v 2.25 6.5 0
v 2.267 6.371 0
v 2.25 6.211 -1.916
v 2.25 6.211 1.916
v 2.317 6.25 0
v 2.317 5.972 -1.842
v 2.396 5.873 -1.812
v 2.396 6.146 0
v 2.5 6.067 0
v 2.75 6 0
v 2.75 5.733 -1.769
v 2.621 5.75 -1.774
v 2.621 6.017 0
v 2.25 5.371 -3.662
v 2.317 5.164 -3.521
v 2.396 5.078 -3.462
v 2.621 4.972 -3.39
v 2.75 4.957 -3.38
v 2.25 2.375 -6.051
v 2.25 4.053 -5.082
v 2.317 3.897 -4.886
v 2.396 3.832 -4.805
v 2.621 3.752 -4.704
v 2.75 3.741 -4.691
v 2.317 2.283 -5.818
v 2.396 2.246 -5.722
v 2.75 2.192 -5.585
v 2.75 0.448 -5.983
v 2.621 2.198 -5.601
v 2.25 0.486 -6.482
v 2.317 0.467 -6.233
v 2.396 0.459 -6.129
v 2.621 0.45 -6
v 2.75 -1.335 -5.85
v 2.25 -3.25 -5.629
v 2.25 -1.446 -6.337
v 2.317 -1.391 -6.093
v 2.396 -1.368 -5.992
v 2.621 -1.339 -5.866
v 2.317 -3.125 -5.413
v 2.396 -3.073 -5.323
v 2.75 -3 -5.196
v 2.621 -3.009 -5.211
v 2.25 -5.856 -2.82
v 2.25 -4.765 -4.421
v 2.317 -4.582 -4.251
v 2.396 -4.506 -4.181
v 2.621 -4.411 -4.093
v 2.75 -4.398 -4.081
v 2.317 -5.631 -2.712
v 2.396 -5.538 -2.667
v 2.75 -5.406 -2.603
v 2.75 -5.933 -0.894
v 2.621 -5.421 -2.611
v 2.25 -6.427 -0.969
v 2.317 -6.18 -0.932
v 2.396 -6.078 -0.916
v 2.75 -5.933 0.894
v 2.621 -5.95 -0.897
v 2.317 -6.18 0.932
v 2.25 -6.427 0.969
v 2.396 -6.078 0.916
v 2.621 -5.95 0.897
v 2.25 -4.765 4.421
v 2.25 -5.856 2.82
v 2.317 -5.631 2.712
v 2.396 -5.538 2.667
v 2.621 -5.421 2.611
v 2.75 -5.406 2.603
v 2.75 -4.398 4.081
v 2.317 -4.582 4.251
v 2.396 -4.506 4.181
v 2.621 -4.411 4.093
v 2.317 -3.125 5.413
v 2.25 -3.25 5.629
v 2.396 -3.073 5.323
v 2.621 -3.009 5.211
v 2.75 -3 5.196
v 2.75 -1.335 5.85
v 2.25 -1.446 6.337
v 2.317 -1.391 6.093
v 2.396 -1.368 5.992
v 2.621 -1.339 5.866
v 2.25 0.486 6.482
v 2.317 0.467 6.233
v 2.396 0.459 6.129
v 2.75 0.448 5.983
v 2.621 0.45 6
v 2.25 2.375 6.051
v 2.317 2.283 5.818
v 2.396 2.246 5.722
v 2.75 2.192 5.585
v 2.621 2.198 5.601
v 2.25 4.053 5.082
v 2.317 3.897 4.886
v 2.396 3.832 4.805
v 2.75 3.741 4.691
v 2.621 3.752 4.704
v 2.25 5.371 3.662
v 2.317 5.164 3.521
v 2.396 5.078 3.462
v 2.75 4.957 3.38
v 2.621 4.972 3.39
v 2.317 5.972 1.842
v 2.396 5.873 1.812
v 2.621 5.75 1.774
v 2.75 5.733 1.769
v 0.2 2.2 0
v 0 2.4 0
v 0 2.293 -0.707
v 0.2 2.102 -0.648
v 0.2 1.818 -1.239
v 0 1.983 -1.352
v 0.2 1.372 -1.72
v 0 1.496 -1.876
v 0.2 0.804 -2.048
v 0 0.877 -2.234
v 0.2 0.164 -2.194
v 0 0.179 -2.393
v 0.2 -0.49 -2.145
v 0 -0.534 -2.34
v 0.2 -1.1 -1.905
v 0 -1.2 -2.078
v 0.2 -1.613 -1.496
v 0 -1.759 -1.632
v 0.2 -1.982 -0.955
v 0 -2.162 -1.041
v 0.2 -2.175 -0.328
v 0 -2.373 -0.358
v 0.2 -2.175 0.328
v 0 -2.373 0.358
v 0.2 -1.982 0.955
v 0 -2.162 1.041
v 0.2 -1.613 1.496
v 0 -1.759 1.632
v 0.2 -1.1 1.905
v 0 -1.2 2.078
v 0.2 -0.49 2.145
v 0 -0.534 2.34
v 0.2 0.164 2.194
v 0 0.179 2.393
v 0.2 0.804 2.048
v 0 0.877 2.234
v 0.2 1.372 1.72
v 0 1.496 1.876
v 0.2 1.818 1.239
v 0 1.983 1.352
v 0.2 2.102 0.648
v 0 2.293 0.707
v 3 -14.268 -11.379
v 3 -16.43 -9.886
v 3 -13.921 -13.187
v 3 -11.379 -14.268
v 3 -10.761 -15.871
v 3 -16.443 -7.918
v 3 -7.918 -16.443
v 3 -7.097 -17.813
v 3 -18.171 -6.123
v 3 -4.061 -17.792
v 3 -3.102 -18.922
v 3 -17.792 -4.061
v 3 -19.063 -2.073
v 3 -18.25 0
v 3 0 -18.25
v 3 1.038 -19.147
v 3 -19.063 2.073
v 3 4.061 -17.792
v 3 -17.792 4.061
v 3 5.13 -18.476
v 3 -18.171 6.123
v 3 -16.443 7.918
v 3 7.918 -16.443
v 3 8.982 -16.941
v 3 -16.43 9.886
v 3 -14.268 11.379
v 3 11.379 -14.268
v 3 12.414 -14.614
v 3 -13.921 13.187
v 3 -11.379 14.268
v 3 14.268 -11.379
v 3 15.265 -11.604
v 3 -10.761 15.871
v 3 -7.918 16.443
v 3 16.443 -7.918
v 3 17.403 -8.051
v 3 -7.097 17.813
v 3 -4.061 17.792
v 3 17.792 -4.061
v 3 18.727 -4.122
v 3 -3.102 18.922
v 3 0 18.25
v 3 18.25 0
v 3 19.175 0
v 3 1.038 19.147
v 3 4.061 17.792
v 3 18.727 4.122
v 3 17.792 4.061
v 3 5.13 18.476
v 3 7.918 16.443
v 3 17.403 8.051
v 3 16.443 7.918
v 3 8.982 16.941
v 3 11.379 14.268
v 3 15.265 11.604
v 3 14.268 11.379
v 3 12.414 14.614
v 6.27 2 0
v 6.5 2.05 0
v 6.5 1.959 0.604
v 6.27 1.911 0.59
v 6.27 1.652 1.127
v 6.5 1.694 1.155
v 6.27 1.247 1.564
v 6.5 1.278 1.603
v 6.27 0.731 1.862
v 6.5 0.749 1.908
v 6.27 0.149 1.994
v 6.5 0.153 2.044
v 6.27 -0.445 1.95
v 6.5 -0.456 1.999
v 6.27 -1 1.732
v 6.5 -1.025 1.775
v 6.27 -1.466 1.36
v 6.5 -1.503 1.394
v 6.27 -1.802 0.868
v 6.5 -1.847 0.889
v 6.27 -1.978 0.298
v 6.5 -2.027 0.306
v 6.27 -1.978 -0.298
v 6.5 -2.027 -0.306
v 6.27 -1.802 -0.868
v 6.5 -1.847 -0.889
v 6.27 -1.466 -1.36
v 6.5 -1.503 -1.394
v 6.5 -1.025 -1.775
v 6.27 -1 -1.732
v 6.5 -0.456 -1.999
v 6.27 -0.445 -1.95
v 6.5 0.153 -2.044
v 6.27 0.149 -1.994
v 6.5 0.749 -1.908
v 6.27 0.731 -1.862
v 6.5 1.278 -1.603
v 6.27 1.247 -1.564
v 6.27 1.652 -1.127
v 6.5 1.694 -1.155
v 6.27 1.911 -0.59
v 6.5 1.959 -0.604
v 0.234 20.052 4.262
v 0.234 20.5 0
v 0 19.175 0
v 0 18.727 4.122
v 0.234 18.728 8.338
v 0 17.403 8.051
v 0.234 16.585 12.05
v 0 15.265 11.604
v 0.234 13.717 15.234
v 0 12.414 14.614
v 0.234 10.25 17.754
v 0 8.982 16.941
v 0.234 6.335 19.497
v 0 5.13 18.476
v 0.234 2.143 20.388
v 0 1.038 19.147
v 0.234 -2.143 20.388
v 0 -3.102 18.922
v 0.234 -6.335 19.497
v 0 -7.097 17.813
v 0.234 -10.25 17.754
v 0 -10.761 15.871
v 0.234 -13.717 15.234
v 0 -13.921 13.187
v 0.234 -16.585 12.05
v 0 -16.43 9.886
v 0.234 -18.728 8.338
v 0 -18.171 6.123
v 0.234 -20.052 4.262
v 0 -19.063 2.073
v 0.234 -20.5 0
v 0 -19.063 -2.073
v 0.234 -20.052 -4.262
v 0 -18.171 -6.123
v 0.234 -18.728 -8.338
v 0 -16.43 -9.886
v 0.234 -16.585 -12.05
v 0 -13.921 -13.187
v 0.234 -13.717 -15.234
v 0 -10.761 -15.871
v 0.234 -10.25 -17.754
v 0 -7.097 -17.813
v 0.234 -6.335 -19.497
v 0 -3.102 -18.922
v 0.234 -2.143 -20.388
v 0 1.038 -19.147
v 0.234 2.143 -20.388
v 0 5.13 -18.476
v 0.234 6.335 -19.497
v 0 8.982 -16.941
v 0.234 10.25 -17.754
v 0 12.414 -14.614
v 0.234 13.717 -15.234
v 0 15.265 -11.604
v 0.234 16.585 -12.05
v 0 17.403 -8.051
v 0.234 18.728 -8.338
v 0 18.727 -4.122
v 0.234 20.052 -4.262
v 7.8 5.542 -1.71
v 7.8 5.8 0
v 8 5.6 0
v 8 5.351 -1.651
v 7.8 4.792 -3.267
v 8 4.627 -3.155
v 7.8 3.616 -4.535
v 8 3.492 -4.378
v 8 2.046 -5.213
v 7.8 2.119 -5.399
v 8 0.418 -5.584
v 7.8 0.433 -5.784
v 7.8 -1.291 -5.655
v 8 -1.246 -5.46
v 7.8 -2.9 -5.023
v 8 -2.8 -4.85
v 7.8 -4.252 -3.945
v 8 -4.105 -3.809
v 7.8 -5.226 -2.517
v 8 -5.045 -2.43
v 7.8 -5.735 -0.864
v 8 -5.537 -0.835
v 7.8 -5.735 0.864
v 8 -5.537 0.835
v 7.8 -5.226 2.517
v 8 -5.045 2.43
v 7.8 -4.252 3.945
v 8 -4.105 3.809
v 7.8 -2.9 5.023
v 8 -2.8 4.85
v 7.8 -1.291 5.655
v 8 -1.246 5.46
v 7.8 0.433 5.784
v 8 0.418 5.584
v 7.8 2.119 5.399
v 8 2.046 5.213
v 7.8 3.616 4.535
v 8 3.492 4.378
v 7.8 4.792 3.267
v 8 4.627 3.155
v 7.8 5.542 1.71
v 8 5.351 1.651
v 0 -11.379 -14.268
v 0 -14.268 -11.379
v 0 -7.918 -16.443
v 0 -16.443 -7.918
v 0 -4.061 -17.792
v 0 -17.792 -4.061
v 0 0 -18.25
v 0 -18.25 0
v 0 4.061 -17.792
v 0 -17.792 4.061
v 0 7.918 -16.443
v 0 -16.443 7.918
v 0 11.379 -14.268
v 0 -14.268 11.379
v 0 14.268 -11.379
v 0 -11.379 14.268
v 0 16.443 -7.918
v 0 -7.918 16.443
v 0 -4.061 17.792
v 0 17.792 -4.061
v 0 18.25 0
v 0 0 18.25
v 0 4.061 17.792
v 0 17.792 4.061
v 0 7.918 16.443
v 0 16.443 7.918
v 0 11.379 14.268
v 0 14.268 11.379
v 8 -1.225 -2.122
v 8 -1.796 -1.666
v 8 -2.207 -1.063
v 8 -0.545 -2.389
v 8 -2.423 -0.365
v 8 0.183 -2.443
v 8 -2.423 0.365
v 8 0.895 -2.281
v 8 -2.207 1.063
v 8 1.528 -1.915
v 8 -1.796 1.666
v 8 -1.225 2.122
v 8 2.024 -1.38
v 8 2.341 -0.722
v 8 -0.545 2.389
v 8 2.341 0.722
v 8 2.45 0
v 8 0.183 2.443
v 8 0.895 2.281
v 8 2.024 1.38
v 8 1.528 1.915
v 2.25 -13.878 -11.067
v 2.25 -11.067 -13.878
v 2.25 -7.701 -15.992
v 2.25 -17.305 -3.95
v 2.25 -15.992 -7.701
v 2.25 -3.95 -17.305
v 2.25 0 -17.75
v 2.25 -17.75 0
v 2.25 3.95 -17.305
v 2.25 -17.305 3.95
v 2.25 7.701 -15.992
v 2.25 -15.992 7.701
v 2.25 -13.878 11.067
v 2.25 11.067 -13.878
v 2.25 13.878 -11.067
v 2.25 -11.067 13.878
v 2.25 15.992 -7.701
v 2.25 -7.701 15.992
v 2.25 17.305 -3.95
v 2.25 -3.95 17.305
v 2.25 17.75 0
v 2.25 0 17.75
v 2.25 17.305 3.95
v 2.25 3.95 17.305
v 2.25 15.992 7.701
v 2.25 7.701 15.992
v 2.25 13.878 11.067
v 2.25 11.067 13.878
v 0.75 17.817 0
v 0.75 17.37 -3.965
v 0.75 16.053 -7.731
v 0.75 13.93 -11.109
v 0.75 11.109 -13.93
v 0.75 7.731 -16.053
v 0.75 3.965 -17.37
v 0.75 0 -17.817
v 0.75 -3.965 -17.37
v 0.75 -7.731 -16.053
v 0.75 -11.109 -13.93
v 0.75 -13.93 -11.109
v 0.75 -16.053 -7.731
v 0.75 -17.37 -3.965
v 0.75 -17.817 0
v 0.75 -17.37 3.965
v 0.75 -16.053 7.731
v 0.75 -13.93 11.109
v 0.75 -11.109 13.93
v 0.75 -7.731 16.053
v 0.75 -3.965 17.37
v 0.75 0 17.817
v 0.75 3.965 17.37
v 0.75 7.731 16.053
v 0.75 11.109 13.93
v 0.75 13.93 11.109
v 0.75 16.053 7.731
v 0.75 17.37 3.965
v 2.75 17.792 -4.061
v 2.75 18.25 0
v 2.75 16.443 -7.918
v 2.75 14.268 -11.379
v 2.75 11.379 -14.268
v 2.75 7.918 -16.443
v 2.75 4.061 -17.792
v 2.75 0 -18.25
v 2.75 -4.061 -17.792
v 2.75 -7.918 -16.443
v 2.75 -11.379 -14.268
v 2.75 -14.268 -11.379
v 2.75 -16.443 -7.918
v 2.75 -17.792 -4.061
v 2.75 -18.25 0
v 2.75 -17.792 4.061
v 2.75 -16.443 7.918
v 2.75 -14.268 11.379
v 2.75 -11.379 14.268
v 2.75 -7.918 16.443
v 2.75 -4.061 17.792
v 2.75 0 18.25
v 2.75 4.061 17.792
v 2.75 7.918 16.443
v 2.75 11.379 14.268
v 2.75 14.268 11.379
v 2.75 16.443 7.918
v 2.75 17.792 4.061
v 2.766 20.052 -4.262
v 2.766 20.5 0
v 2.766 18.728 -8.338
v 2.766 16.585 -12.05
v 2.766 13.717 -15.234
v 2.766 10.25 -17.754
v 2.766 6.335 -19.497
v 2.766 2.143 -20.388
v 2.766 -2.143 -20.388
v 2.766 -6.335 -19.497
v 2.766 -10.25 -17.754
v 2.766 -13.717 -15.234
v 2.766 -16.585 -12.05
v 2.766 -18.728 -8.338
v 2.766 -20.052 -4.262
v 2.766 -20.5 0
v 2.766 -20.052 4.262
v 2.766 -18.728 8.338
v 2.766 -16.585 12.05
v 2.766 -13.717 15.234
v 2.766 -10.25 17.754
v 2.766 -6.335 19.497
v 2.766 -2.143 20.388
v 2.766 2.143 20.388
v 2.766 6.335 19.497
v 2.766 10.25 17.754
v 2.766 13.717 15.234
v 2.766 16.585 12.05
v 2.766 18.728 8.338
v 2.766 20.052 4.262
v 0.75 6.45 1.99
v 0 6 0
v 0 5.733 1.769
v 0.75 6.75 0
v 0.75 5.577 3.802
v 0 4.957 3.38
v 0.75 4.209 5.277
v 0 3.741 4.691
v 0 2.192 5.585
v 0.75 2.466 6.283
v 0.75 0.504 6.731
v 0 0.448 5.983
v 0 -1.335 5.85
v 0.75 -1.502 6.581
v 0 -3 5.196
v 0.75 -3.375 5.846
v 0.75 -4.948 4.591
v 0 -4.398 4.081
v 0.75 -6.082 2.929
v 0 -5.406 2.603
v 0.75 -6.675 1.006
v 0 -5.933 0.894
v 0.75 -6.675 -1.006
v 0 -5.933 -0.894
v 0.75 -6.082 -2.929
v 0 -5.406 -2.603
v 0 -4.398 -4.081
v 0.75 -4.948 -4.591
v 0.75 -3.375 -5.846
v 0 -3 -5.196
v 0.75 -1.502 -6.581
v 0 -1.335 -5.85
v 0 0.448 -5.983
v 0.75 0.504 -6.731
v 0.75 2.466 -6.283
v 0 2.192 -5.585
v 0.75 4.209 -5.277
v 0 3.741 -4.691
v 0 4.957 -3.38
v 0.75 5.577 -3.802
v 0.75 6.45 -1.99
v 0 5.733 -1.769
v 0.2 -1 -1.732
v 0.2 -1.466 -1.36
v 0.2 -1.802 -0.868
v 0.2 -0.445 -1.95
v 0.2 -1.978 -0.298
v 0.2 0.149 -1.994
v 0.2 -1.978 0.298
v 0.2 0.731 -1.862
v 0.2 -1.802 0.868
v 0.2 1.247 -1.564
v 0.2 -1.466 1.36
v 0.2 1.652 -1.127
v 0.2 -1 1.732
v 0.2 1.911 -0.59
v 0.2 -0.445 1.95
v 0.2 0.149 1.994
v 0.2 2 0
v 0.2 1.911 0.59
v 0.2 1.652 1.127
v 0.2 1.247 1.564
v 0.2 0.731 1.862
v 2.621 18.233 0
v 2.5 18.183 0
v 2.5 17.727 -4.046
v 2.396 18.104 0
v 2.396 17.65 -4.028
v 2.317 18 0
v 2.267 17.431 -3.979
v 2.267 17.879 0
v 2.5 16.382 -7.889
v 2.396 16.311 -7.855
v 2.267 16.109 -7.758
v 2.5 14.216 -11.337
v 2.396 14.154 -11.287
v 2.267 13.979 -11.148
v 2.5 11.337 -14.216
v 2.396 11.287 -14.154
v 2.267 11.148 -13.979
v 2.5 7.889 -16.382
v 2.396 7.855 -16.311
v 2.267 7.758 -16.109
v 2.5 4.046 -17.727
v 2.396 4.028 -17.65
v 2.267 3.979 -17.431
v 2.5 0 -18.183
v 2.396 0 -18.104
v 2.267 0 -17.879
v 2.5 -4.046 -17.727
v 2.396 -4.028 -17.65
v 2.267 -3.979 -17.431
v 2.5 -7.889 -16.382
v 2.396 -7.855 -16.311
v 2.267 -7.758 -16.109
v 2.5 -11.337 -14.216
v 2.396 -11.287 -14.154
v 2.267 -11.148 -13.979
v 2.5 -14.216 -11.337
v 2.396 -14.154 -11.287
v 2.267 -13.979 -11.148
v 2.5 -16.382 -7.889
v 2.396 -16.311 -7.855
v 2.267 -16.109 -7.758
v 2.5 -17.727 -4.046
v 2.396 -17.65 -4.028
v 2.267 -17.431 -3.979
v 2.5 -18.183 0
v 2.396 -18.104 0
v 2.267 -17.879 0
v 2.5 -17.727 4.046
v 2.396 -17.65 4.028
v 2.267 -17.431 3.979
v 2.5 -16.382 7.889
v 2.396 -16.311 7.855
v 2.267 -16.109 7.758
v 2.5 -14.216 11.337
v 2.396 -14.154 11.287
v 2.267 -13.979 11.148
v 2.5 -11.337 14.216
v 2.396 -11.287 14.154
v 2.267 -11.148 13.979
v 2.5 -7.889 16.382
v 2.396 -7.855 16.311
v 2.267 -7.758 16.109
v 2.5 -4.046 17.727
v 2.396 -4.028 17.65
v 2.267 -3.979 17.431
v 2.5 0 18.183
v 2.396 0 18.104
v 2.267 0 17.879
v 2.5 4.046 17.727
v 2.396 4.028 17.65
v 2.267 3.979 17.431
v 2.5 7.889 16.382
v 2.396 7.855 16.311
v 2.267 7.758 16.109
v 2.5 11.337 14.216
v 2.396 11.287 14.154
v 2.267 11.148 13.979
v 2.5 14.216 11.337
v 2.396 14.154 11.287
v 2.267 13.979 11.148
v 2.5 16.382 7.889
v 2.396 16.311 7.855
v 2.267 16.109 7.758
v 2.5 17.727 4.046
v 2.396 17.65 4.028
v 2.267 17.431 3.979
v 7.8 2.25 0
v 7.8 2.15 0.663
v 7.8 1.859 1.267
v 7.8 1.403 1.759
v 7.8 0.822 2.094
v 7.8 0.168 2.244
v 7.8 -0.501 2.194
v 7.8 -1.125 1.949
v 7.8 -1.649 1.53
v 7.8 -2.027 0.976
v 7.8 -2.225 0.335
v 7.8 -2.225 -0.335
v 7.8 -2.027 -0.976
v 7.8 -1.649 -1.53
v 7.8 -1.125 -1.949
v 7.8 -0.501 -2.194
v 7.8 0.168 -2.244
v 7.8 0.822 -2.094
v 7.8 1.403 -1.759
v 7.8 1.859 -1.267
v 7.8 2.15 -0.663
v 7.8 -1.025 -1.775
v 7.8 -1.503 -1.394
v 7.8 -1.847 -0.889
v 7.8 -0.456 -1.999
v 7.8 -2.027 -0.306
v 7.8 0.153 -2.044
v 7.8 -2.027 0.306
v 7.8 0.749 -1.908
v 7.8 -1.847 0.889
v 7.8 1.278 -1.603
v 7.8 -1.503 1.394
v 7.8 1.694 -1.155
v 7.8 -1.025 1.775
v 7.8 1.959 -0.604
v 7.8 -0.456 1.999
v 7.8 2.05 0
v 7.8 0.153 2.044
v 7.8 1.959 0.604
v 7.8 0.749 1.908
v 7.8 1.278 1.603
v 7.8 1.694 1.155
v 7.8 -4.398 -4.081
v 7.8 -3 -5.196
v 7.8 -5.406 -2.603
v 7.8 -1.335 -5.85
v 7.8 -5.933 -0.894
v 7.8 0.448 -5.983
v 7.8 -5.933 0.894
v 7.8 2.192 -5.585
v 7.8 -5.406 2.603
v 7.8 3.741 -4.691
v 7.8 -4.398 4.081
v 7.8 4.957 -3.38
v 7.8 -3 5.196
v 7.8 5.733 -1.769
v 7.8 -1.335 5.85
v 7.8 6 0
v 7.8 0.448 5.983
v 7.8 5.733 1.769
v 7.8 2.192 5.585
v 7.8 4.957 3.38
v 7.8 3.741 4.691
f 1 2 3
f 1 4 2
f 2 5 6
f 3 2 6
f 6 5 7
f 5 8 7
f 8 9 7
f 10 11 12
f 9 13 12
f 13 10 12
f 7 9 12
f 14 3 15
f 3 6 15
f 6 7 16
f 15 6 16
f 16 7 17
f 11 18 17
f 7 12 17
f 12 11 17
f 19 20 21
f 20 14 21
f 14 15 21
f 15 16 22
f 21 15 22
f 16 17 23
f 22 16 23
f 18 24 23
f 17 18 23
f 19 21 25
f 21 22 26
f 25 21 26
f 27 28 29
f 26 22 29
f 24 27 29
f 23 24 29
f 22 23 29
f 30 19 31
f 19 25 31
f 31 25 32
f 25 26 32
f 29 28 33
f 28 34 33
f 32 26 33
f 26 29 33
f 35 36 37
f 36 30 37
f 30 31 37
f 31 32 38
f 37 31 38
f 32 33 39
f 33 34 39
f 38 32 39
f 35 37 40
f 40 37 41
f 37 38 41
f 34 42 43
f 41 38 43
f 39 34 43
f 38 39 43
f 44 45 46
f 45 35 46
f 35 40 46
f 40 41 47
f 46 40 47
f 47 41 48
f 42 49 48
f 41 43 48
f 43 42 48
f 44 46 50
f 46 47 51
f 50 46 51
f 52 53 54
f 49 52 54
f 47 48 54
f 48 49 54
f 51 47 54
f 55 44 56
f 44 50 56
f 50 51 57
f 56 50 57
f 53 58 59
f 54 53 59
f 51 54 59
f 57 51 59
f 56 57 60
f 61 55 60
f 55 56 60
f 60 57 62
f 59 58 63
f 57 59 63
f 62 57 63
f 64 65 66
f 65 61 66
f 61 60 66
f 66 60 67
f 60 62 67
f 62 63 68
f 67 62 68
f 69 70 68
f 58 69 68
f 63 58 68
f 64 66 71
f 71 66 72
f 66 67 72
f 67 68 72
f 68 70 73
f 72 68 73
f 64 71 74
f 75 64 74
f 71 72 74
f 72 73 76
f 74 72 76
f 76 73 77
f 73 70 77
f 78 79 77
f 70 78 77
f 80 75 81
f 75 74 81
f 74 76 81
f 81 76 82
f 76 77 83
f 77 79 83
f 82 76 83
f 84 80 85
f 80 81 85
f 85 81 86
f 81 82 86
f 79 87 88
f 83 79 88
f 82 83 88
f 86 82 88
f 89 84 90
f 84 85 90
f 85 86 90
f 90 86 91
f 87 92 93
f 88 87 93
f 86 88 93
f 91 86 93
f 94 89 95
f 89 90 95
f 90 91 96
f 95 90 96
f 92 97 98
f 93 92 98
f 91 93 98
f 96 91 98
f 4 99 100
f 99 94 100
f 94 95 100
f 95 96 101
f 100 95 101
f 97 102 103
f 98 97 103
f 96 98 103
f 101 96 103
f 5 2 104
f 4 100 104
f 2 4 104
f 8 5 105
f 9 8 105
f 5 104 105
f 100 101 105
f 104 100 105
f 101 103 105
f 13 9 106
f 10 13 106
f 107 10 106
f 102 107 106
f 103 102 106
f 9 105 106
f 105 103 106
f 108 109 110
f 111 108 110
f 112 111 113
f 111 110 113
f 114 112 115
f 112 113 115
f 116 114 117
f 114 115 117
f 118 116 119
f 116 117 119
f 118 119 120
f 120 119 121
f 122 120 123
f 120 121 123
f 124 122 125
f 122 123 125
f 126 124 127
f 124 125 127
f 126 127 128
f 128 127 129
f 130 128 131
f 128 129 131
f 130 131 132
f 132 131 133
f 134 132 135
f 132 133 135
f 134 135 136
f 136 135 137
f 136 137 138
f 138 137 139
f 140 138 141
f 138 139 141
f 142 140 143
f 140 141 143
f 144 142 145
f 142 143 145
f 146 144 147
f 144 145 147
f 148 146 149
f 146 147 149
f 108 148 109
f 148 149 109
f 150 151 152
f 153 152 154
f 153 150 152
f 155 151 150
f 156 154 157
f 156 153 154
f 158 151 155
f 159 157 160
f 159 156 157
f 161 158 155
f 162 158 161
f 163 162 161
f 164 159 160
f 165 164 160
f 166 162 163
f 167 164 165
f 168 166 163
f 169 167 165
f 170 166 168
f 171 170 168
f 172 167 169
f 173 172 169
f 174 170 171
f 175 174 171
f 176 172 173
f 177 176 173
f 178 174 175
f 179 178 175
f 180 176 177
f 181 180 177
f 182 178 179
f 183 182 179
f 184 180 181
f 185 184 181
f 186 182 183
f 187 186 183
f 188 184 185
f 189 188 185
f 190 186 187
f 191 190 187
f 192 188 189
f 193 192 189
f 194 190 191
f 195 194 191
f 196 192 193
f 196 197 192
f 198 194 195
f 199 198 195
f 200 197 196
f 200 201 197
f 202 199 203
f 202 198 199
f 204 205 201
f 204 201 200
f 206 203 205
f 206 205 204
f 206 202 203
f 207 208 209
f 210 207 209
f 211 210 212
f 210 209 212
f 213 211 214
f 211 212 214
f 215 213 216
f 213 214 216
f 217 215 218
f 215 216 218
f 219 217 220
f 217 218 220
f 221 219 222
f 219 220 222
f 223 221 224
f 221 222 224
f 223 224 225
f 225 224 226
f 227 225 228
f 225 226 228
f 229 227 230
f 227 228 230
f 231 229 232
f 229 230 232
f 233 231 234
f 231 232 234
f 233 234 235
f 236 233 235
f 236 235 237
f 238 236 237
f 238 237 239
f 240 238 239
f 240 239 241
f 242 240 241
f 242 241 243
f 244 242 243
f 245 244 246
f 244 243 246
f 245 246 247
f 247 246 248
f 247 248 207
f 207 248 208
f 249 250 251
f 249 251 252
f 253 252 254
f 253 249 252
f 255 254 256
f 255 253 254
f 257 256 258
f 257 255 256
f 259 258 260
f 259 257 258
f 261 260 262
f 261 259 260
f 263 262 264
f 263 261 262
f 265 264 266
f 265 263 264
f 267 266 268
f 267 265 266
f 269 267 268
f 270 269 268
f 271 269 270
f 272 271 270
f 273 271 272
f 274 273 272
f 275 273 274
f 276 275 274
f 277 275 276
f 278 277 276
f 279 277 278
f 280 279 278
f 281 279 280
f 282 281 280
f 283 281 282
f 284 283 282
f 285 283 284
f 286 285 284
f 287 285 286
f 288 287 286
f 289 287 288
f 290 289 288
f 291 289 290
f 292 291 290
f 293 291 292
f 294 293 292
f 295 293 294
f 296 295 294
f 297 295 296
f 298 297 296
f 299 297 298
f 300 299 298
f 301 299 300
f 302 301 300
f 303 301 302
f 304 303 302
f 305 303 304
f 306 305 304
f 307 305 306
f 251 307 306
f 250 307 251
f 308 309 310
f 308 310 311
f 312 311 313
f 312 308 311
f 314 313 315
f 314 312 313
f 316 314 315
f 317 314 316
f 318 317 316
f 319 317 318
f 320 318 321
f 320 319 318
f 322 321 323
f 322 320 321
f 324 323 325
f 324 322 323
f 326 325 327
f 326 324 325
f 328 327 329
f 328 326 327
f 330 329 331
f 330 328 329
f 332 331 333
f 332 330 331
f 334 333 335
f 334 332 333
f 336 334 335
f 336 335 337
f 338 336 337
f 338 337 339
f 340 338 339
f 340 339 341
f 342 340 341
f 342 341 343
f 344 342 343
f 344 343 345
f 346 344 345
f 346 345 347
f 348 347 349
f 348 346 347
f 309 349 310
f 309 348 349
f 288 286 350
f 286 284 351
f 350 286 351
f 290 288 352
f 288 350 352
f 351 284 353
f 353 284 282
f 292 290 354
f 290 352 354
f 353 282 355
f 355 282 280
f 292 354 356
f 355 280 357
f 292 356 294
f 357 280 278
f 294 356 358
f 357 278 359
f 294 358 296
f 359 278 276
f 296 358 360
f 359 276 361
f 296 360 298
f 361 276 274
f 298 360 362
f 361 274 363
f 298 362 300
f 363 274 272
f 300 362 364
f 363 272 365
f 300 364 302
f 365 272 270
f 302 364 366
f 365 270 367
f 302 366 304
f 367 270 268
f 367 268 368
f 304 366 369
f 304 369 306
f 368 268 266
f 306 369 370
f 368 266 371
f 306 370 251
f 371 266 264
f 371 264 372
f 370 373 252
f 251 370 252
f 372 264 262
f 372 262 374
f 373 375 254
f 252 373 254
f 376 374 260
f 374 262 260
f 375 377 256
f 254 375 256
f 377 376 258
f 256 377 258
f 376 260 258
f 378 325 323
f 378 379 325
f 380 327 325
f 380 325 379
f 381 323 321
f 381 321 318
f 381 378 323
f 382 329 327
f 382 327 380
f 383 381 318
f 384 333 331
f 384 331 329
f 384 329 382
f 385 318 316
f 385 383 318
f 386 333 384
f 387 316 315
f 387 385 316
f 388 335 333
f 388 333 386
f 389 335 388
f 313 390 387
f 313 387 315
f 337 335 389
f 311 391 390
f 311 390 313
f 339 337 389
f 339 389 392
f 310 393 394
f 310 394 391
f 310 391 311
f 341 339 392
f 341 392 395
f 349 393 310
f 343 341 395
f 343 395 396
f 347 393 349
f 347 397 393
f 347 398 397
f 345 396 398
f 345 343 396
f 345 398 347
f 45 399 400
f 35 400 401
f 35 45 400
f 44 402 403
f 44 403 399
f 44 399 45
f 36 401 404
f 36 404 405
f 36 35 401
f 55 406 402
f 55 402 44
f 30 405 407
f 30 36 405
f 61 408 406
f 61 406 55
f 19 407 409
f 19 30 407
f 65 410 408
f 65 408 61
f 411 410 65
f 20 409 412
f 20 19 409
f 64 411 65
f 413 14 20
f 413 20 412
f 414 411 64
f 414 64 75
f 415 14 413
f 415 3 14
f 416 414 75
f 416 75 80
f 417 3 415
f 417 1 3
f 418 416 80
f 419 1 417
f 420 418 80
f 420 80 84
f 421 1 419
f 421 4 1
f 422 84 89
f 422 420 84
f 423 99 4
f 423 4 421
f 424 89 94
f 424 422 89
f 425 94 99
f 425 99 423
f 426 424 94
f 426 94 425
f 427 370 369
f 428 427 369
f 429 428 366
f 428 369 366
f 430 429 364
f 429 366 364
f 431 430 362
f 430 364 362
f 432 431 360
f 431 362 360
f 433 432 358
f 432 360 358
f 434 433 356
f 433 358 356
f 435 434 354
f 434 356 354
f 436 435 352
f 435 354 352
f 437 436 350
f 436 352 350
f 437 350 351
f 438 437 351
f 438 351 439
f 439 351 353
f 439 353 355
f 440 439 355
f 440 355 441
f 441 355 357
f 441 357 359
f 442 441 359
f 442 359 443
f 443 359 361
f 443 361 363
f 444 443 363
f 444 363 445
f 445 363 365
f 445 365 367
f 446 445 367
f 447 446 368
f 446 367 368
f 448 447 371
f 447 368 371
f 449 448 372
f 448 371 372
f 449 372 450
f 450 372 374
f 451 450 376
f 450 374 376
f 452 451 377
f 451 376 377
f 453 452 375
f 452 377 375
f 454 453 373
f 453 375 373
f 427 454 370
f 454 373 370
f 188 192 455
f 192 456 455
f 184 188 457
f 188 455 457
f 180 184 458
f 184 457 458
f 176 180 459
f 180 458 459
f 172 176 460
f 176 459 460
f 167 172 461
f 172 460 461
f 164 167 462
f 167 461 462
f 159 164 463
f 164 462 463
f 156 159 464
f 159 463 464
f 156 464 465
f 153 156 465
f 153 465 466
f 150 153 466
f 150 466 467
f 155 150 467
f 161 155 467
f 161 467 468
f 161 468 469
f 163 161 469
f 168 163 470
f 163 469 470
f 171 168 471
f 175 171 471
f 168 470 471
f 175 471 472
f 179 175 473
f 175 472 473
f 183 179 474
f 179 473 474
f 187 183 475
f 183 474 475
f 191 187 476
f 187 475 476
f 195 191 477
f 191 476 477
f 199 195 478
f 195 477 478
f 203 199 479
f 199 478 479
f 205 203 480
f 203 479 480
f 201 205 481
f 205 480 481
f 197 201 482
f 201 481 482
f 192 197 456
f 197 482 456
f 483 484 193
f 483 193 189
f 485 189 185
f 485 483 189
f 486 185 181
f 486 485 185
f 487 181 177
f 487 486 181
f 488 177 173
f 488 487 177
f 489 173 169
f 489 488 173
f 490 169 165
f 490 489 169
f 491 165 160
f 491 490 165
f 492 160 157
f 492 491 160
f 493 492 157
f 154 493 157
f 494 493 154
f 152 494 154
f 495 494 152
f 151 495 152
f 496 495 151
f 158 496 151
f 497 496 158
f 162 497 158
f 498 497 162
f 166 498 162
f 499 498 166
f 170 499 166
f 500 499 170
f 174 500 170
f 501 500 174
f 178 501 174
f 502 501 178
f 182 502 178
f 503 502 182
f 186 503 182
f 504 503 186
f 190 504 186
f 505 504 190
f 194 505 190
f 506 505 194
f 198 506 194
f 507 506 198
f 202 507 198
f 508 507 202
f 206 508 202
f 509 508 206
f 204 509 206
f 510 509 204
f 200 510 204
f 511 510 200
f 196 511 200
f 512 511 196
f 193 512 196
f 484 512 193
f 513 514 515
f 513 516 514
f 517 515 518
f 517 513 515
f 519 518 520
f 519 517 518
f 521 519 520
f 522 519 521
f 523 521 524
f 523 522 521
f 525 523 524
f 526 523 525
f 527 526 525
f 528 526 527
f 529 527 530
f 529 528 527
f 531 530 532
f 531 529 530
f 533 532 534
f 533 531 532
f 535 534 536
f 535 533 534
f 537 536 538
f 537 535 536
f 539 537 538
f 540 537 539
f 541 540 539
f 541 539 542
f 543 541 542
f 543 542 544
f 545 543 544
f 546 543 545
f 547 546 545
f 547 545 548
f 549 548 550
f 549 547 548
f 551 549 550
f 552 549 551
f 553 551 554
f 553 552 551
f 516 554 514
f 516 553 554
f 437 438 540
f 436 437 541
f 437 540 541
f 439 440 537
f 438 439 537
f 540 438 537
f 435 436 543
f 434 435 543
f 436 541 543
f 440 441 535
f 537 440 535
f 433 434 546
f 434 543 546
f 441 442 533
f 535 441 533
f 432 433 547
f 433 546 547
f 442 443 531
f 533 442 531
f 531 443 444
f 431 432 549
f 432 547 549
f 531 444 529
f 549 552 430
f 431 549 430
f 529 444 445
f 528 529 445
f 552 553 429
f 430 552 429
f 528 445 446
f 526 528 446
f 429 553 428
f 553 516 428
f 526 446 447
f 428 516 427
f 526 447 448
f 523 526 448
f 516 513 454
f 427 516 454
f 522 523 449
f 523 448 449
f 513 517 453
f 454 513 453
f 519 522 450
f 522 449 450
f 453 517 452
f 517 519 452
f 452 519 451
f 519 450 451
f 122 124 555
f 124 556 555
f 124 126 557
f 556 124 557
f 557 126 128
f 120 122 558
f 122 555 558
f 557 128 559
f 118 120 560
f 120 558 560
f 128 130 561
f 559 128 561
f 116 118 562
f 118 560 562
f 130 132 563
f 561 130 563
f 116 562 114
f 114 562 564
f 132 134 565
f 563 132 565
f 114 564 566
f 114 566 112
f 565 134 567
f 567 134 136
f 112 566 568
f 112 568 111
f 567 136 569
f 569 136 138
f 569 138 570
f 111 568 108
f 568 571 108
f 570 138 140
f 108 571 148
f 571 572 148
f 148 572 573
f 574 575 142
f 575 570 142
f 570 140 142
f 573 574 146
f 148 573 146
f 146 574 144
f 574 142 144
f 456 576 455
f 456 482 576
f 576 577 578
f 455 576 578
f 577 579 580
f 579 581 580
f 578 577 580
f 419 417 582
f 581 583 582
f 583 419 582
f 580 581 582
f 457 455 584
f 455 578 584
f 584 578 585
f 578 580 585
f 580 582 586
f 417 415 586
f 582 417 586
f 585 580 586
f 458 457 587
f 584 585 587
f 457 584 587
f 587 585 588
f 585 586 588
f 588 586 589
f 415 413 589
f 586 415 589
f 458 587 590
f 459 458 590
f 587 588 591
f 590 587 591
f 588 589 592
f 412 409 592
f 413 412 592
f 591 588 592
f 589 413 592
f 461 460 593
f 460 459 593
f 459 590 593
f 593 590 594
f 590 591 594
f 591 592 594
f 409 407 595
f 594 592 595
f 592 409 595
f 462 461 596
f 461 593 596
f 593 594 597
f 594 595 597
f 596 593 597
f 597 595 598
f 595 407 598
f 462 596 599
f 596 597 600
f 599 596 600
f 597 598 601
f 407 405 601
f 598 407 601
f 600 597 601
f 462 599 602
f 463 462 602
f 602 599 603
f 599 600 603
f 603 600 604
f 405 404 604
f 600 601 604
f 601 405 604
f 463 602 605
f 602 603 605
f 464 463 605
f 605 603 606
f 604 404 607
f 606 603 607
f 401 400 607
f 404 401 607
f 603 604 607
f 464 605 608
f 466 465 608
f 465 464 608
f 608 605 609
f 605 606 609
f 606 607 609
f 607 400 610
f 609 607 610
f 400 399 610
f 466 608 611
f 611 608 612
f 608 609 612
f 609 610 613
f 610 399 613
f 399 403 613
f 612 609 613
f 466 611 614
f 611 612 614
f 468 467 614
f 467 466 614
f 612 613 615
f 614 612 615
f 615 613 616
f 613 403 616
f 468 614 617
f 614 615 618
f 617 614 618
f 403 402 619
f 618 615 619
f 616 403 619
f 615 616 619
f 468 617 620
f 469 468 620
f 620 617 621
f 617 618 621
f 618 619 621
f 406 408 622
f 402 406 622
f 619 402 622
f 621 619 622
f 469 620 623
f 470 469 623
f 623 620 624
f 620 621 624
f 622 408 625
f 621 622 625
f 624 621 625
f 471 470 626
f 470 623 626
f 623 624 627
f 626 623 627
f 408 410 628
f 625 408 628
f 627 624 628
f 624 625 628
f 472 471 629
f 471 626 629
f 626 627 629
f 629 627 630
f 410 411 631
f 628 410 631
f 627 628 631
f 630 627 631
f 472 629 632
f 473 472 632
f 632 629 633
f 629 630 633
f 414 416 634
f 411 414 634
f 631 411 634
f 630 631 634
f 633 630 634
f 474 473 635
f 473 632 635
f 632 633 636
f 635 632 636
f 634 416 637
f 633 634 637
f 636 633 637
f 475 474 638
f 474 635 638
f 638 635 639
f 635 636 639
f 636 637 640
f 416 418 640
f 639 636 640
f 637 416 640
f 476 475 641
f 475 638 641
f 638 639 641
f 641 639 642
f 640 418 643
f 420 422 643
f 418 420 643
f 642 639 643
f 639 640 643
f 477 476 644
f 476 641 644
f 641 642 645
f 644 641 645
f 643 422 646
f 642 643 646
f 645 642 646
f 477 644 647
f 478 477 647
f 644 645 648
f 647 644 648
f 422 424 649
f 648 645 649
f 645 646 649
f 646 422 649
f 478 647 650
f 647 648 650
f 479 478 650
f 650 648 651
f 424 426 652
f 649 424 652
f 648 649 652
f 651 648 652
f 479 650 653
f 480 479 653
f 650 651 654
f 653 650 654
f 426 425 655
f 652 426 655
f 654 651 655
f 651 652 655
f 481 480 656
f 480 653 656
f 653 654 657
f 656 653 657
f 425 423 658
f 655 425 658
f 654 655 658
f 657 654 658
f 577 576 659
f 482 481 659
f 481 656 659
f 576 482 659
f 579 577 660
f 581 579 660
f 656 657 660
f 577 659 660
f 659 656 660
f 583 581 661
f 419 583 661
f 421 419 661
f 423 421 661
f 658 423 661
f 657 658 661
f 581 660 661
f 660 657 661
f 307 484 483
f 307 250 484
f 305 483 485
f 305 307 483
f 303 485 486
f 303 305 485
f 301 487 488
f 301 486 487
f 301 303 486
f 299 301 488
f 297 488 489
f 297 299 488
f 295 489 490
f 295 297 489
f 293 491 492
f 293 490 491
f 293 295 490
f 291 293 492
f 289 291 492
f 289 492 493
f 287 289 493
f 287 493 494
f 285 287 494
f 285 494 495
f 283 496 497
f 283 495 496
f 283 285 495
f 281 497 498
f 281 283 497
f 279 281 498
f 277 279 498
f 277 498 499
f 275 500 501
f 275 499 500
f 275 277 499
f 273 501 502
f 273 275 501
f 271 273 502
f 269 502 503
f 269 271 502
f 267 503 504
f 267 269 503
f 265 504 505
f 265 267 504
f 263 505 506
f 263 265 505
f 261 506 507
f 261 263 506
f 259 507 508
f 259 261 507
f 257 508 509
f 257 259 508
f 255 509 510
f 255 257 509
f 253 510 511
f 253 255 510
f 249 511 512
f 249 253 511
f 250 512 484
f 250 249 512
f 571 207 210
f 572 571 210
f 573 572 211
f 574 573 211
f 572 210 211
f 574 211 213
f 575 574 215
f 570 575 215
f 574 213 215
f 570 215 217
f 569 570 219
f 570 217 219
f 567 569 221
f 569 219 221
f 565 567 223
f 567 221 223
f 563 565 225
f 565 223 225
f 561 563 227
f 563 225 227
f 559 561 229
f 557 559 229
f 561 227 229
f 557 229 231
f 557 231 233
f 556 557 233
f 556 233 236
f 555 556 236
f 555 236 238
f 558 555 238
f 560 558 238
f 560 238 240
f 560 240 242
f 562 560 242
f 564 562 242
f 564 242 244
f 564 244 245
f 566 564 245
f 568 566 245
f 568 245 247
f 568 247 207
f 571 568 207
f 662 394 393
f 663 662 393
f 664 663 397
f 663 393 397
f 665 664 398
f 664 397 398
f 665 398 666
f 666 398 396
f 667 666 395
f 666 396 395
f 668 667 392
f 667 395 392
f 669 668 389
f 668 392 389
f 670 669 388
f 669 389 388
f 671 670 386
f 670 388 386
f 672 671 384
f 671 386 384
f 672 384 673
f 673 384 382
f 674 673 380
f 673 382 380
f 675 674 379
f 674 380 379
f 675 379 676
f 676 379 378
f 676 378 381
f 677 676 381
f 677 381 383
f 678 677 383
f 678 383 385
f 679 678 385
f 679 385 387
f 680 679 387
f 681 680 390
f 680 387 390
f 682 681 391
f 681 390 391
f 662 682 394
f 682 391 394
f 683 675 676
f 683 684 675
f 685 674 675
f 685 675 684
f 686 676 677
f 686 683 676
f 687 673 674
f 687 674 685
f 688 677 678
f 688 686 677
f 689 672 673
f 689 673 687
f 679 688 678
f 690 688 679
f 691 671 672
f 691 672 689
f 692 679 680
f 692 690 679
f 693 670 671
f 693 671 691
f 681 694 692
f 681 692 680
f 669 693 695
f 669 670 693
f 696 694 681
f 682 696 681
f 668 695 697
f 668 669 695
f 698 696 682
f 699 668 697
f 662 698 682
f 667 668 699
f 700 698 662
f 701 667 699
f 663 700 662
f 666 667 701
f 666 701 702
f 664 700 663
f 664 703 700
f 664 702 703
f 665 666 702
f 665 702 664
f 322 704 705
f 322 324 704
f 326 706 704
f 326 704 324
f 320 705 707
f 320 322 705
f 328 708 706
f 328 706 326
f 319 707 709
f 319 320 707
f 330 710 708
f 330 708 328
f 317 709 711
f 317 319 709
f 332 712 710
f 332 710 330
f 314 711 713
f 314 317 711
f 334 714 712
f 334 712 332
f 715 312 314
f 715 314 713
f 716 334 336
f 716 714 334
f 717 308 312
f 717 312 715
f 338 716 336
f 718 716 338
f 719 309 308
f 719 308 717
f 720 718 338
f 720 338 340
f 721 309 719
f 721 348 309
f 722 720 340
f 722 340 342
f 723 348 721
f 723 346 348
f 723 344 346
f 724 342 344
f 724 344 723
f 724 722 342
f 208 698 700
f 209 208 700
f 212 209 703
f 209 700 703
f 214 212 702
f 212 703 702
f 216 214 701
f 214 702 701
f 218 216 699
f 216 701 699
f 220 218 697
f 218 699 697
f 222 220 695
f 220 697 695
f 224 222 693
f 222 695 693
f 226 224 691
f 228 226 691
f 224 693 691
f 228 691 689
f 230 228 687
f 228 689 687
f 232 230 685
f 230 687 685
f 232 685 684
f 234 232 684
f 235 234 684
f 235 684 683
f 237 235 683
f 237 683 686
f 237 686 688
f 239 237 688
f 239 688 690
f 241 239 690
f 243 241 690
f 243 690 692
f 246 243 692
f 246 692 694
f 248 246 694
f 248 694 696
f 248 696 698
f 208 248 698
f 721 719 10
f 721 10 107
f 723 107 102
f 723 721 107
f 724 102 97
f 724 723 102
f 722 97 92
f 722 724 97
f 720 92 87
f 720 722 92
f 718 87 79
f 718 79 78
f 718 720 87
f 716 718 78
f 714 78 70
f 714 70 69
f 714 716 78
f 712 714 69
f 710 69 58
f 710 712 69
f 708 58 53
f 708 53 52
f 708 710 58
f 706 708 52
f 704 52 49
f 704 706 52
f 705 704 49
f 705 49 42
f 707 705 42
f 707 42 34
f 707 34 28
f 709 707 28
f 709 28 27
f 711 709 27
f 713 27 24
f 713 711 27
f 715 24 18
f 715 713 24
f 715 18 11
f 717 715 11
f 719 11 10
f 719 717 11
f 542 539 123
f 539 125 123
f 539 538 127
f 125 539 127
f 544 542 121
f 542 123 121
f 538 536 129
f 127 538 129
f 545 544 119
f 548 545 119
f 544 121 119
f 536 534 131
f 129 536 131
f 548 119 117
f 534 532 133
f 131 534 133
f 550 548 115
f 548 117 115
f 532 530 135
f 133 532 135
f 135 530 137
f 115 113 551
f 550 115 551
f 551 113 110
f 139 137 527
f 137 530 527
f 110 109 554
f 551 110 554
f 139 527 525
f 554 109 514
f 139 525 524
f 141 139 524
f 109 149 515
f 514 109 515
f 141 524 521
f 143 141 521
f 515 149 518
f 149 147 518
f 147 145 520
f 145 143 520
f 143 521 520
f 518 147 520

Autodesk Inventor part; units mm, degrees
ref_plane "YZ Plane" through (0, 0, 0) normal (1, 0, 0) x (0, 1, 0)
ref_plane "XZ Plane" through (0, 0, 0) normal (0, 1, 0) x (-1, 0, 0)
ref_plane "XY Plane" through (0, 0, 0) normal (0, 0, 1) x (1, 0, 0)
sketch "Sketch_2" plane through (0, 0, 0) normal (0, 0, 1) x (1, 0, 0)
  line L0 (8, 0) -> (0, 0)
  line L1 (0, 2.4) -> (0.2, 2.2)
  line L2 (0.2, 2.2) -> (0.2, 2)
  line L3 (0.2, 2) -> (6.27, 2)
  line L4 (6.27, 2) -> (6.5, 2.05)
  line L5 (6.5, 2.05) -> (7.8, 2.05)
  line L6 (7.8, 2.05) -> (7.8, 2.25)
  line L7 (7.8, 2.25) -> (8, 2.45)
  line L8 (8, 2.45) -> (8, 5.6)
  line L9 (8, 5.6) -> (7.8, 5.8)
  line L10 (7.8, 5.8) -> (7.8, 6)
  line L11 (7.8, 6) -> (3.5, 6)
  arc A0 (3, 6.5) -> (3.5, 6) centre (3.5, 6.5) ccw
  line L12 (3, 6.5) -> (3, 19.175)
  line L13 (3, 19.175) -> (2.7664, 20.5)
  line L14 (2.7664, 20.5) -> (0.2336, 20.5)
  line L15 (0.2336, 20.5) -> (0, 19.175)
  line L16 (0, 19.175) -> (0, 2.4)
revolve "Revolution1" add sketch "Sketch_2" angle 360 about axis through (8, 0, 0) along (1, 0, 0)
sketch "Sketch_3" plane through (0, 0, 0) normal (0, 0, 1) x (1, 0, 0)
  line L0 (0.75, 0) -> (0, 0)
  line L1 (-2, 18.25) -> (-2, 6)
  line L2 (-2, 6) -> (0, 6)
  line L3 (0, 6) -> (0.75, 6.75)
  line L4 (0.75, 6.75) -> (0.75, 17.817)
  line L5 (0.75, 17.817) -> (0, 18.25)
  line L6 (0, 18.25) -> (-2, 18.25)
revolve "Revolution2" cut sketch "Sketch_3" angle 360 about axis through (0.75, 0, 0) along (1, 0, 0)
sketch "Sketch_4" plane through (0, 0, 0) normal (0, 0, 1) x (1, 0, 0)
  line L0 (3, 0) -> (2.25, 0)
  line L1 (2.25, 17.75) -> (2.25, 6.5)
  arc A0 (2.25, 6.5) -> (2.75, 6) centre (2.75, 6.5) ccw
  line L2 (2.75, 6) -> (5, 6)
  line L3 (5, 6) -> (5, 18.25)
  line L4 (5, 18.25) -> (2.75, 18.25)
  arc A1 (2.75, 18.25) -> (2.25, 17.75) centre (2.75, 17.75) ccw
revolve "Revolution3" cut sketch "Sketch_4" angle 360 about axis through (3, 0, 0) along (1, 0, 0)
properties part number "焼結ギア" material "鋼、高強度、低合金"
